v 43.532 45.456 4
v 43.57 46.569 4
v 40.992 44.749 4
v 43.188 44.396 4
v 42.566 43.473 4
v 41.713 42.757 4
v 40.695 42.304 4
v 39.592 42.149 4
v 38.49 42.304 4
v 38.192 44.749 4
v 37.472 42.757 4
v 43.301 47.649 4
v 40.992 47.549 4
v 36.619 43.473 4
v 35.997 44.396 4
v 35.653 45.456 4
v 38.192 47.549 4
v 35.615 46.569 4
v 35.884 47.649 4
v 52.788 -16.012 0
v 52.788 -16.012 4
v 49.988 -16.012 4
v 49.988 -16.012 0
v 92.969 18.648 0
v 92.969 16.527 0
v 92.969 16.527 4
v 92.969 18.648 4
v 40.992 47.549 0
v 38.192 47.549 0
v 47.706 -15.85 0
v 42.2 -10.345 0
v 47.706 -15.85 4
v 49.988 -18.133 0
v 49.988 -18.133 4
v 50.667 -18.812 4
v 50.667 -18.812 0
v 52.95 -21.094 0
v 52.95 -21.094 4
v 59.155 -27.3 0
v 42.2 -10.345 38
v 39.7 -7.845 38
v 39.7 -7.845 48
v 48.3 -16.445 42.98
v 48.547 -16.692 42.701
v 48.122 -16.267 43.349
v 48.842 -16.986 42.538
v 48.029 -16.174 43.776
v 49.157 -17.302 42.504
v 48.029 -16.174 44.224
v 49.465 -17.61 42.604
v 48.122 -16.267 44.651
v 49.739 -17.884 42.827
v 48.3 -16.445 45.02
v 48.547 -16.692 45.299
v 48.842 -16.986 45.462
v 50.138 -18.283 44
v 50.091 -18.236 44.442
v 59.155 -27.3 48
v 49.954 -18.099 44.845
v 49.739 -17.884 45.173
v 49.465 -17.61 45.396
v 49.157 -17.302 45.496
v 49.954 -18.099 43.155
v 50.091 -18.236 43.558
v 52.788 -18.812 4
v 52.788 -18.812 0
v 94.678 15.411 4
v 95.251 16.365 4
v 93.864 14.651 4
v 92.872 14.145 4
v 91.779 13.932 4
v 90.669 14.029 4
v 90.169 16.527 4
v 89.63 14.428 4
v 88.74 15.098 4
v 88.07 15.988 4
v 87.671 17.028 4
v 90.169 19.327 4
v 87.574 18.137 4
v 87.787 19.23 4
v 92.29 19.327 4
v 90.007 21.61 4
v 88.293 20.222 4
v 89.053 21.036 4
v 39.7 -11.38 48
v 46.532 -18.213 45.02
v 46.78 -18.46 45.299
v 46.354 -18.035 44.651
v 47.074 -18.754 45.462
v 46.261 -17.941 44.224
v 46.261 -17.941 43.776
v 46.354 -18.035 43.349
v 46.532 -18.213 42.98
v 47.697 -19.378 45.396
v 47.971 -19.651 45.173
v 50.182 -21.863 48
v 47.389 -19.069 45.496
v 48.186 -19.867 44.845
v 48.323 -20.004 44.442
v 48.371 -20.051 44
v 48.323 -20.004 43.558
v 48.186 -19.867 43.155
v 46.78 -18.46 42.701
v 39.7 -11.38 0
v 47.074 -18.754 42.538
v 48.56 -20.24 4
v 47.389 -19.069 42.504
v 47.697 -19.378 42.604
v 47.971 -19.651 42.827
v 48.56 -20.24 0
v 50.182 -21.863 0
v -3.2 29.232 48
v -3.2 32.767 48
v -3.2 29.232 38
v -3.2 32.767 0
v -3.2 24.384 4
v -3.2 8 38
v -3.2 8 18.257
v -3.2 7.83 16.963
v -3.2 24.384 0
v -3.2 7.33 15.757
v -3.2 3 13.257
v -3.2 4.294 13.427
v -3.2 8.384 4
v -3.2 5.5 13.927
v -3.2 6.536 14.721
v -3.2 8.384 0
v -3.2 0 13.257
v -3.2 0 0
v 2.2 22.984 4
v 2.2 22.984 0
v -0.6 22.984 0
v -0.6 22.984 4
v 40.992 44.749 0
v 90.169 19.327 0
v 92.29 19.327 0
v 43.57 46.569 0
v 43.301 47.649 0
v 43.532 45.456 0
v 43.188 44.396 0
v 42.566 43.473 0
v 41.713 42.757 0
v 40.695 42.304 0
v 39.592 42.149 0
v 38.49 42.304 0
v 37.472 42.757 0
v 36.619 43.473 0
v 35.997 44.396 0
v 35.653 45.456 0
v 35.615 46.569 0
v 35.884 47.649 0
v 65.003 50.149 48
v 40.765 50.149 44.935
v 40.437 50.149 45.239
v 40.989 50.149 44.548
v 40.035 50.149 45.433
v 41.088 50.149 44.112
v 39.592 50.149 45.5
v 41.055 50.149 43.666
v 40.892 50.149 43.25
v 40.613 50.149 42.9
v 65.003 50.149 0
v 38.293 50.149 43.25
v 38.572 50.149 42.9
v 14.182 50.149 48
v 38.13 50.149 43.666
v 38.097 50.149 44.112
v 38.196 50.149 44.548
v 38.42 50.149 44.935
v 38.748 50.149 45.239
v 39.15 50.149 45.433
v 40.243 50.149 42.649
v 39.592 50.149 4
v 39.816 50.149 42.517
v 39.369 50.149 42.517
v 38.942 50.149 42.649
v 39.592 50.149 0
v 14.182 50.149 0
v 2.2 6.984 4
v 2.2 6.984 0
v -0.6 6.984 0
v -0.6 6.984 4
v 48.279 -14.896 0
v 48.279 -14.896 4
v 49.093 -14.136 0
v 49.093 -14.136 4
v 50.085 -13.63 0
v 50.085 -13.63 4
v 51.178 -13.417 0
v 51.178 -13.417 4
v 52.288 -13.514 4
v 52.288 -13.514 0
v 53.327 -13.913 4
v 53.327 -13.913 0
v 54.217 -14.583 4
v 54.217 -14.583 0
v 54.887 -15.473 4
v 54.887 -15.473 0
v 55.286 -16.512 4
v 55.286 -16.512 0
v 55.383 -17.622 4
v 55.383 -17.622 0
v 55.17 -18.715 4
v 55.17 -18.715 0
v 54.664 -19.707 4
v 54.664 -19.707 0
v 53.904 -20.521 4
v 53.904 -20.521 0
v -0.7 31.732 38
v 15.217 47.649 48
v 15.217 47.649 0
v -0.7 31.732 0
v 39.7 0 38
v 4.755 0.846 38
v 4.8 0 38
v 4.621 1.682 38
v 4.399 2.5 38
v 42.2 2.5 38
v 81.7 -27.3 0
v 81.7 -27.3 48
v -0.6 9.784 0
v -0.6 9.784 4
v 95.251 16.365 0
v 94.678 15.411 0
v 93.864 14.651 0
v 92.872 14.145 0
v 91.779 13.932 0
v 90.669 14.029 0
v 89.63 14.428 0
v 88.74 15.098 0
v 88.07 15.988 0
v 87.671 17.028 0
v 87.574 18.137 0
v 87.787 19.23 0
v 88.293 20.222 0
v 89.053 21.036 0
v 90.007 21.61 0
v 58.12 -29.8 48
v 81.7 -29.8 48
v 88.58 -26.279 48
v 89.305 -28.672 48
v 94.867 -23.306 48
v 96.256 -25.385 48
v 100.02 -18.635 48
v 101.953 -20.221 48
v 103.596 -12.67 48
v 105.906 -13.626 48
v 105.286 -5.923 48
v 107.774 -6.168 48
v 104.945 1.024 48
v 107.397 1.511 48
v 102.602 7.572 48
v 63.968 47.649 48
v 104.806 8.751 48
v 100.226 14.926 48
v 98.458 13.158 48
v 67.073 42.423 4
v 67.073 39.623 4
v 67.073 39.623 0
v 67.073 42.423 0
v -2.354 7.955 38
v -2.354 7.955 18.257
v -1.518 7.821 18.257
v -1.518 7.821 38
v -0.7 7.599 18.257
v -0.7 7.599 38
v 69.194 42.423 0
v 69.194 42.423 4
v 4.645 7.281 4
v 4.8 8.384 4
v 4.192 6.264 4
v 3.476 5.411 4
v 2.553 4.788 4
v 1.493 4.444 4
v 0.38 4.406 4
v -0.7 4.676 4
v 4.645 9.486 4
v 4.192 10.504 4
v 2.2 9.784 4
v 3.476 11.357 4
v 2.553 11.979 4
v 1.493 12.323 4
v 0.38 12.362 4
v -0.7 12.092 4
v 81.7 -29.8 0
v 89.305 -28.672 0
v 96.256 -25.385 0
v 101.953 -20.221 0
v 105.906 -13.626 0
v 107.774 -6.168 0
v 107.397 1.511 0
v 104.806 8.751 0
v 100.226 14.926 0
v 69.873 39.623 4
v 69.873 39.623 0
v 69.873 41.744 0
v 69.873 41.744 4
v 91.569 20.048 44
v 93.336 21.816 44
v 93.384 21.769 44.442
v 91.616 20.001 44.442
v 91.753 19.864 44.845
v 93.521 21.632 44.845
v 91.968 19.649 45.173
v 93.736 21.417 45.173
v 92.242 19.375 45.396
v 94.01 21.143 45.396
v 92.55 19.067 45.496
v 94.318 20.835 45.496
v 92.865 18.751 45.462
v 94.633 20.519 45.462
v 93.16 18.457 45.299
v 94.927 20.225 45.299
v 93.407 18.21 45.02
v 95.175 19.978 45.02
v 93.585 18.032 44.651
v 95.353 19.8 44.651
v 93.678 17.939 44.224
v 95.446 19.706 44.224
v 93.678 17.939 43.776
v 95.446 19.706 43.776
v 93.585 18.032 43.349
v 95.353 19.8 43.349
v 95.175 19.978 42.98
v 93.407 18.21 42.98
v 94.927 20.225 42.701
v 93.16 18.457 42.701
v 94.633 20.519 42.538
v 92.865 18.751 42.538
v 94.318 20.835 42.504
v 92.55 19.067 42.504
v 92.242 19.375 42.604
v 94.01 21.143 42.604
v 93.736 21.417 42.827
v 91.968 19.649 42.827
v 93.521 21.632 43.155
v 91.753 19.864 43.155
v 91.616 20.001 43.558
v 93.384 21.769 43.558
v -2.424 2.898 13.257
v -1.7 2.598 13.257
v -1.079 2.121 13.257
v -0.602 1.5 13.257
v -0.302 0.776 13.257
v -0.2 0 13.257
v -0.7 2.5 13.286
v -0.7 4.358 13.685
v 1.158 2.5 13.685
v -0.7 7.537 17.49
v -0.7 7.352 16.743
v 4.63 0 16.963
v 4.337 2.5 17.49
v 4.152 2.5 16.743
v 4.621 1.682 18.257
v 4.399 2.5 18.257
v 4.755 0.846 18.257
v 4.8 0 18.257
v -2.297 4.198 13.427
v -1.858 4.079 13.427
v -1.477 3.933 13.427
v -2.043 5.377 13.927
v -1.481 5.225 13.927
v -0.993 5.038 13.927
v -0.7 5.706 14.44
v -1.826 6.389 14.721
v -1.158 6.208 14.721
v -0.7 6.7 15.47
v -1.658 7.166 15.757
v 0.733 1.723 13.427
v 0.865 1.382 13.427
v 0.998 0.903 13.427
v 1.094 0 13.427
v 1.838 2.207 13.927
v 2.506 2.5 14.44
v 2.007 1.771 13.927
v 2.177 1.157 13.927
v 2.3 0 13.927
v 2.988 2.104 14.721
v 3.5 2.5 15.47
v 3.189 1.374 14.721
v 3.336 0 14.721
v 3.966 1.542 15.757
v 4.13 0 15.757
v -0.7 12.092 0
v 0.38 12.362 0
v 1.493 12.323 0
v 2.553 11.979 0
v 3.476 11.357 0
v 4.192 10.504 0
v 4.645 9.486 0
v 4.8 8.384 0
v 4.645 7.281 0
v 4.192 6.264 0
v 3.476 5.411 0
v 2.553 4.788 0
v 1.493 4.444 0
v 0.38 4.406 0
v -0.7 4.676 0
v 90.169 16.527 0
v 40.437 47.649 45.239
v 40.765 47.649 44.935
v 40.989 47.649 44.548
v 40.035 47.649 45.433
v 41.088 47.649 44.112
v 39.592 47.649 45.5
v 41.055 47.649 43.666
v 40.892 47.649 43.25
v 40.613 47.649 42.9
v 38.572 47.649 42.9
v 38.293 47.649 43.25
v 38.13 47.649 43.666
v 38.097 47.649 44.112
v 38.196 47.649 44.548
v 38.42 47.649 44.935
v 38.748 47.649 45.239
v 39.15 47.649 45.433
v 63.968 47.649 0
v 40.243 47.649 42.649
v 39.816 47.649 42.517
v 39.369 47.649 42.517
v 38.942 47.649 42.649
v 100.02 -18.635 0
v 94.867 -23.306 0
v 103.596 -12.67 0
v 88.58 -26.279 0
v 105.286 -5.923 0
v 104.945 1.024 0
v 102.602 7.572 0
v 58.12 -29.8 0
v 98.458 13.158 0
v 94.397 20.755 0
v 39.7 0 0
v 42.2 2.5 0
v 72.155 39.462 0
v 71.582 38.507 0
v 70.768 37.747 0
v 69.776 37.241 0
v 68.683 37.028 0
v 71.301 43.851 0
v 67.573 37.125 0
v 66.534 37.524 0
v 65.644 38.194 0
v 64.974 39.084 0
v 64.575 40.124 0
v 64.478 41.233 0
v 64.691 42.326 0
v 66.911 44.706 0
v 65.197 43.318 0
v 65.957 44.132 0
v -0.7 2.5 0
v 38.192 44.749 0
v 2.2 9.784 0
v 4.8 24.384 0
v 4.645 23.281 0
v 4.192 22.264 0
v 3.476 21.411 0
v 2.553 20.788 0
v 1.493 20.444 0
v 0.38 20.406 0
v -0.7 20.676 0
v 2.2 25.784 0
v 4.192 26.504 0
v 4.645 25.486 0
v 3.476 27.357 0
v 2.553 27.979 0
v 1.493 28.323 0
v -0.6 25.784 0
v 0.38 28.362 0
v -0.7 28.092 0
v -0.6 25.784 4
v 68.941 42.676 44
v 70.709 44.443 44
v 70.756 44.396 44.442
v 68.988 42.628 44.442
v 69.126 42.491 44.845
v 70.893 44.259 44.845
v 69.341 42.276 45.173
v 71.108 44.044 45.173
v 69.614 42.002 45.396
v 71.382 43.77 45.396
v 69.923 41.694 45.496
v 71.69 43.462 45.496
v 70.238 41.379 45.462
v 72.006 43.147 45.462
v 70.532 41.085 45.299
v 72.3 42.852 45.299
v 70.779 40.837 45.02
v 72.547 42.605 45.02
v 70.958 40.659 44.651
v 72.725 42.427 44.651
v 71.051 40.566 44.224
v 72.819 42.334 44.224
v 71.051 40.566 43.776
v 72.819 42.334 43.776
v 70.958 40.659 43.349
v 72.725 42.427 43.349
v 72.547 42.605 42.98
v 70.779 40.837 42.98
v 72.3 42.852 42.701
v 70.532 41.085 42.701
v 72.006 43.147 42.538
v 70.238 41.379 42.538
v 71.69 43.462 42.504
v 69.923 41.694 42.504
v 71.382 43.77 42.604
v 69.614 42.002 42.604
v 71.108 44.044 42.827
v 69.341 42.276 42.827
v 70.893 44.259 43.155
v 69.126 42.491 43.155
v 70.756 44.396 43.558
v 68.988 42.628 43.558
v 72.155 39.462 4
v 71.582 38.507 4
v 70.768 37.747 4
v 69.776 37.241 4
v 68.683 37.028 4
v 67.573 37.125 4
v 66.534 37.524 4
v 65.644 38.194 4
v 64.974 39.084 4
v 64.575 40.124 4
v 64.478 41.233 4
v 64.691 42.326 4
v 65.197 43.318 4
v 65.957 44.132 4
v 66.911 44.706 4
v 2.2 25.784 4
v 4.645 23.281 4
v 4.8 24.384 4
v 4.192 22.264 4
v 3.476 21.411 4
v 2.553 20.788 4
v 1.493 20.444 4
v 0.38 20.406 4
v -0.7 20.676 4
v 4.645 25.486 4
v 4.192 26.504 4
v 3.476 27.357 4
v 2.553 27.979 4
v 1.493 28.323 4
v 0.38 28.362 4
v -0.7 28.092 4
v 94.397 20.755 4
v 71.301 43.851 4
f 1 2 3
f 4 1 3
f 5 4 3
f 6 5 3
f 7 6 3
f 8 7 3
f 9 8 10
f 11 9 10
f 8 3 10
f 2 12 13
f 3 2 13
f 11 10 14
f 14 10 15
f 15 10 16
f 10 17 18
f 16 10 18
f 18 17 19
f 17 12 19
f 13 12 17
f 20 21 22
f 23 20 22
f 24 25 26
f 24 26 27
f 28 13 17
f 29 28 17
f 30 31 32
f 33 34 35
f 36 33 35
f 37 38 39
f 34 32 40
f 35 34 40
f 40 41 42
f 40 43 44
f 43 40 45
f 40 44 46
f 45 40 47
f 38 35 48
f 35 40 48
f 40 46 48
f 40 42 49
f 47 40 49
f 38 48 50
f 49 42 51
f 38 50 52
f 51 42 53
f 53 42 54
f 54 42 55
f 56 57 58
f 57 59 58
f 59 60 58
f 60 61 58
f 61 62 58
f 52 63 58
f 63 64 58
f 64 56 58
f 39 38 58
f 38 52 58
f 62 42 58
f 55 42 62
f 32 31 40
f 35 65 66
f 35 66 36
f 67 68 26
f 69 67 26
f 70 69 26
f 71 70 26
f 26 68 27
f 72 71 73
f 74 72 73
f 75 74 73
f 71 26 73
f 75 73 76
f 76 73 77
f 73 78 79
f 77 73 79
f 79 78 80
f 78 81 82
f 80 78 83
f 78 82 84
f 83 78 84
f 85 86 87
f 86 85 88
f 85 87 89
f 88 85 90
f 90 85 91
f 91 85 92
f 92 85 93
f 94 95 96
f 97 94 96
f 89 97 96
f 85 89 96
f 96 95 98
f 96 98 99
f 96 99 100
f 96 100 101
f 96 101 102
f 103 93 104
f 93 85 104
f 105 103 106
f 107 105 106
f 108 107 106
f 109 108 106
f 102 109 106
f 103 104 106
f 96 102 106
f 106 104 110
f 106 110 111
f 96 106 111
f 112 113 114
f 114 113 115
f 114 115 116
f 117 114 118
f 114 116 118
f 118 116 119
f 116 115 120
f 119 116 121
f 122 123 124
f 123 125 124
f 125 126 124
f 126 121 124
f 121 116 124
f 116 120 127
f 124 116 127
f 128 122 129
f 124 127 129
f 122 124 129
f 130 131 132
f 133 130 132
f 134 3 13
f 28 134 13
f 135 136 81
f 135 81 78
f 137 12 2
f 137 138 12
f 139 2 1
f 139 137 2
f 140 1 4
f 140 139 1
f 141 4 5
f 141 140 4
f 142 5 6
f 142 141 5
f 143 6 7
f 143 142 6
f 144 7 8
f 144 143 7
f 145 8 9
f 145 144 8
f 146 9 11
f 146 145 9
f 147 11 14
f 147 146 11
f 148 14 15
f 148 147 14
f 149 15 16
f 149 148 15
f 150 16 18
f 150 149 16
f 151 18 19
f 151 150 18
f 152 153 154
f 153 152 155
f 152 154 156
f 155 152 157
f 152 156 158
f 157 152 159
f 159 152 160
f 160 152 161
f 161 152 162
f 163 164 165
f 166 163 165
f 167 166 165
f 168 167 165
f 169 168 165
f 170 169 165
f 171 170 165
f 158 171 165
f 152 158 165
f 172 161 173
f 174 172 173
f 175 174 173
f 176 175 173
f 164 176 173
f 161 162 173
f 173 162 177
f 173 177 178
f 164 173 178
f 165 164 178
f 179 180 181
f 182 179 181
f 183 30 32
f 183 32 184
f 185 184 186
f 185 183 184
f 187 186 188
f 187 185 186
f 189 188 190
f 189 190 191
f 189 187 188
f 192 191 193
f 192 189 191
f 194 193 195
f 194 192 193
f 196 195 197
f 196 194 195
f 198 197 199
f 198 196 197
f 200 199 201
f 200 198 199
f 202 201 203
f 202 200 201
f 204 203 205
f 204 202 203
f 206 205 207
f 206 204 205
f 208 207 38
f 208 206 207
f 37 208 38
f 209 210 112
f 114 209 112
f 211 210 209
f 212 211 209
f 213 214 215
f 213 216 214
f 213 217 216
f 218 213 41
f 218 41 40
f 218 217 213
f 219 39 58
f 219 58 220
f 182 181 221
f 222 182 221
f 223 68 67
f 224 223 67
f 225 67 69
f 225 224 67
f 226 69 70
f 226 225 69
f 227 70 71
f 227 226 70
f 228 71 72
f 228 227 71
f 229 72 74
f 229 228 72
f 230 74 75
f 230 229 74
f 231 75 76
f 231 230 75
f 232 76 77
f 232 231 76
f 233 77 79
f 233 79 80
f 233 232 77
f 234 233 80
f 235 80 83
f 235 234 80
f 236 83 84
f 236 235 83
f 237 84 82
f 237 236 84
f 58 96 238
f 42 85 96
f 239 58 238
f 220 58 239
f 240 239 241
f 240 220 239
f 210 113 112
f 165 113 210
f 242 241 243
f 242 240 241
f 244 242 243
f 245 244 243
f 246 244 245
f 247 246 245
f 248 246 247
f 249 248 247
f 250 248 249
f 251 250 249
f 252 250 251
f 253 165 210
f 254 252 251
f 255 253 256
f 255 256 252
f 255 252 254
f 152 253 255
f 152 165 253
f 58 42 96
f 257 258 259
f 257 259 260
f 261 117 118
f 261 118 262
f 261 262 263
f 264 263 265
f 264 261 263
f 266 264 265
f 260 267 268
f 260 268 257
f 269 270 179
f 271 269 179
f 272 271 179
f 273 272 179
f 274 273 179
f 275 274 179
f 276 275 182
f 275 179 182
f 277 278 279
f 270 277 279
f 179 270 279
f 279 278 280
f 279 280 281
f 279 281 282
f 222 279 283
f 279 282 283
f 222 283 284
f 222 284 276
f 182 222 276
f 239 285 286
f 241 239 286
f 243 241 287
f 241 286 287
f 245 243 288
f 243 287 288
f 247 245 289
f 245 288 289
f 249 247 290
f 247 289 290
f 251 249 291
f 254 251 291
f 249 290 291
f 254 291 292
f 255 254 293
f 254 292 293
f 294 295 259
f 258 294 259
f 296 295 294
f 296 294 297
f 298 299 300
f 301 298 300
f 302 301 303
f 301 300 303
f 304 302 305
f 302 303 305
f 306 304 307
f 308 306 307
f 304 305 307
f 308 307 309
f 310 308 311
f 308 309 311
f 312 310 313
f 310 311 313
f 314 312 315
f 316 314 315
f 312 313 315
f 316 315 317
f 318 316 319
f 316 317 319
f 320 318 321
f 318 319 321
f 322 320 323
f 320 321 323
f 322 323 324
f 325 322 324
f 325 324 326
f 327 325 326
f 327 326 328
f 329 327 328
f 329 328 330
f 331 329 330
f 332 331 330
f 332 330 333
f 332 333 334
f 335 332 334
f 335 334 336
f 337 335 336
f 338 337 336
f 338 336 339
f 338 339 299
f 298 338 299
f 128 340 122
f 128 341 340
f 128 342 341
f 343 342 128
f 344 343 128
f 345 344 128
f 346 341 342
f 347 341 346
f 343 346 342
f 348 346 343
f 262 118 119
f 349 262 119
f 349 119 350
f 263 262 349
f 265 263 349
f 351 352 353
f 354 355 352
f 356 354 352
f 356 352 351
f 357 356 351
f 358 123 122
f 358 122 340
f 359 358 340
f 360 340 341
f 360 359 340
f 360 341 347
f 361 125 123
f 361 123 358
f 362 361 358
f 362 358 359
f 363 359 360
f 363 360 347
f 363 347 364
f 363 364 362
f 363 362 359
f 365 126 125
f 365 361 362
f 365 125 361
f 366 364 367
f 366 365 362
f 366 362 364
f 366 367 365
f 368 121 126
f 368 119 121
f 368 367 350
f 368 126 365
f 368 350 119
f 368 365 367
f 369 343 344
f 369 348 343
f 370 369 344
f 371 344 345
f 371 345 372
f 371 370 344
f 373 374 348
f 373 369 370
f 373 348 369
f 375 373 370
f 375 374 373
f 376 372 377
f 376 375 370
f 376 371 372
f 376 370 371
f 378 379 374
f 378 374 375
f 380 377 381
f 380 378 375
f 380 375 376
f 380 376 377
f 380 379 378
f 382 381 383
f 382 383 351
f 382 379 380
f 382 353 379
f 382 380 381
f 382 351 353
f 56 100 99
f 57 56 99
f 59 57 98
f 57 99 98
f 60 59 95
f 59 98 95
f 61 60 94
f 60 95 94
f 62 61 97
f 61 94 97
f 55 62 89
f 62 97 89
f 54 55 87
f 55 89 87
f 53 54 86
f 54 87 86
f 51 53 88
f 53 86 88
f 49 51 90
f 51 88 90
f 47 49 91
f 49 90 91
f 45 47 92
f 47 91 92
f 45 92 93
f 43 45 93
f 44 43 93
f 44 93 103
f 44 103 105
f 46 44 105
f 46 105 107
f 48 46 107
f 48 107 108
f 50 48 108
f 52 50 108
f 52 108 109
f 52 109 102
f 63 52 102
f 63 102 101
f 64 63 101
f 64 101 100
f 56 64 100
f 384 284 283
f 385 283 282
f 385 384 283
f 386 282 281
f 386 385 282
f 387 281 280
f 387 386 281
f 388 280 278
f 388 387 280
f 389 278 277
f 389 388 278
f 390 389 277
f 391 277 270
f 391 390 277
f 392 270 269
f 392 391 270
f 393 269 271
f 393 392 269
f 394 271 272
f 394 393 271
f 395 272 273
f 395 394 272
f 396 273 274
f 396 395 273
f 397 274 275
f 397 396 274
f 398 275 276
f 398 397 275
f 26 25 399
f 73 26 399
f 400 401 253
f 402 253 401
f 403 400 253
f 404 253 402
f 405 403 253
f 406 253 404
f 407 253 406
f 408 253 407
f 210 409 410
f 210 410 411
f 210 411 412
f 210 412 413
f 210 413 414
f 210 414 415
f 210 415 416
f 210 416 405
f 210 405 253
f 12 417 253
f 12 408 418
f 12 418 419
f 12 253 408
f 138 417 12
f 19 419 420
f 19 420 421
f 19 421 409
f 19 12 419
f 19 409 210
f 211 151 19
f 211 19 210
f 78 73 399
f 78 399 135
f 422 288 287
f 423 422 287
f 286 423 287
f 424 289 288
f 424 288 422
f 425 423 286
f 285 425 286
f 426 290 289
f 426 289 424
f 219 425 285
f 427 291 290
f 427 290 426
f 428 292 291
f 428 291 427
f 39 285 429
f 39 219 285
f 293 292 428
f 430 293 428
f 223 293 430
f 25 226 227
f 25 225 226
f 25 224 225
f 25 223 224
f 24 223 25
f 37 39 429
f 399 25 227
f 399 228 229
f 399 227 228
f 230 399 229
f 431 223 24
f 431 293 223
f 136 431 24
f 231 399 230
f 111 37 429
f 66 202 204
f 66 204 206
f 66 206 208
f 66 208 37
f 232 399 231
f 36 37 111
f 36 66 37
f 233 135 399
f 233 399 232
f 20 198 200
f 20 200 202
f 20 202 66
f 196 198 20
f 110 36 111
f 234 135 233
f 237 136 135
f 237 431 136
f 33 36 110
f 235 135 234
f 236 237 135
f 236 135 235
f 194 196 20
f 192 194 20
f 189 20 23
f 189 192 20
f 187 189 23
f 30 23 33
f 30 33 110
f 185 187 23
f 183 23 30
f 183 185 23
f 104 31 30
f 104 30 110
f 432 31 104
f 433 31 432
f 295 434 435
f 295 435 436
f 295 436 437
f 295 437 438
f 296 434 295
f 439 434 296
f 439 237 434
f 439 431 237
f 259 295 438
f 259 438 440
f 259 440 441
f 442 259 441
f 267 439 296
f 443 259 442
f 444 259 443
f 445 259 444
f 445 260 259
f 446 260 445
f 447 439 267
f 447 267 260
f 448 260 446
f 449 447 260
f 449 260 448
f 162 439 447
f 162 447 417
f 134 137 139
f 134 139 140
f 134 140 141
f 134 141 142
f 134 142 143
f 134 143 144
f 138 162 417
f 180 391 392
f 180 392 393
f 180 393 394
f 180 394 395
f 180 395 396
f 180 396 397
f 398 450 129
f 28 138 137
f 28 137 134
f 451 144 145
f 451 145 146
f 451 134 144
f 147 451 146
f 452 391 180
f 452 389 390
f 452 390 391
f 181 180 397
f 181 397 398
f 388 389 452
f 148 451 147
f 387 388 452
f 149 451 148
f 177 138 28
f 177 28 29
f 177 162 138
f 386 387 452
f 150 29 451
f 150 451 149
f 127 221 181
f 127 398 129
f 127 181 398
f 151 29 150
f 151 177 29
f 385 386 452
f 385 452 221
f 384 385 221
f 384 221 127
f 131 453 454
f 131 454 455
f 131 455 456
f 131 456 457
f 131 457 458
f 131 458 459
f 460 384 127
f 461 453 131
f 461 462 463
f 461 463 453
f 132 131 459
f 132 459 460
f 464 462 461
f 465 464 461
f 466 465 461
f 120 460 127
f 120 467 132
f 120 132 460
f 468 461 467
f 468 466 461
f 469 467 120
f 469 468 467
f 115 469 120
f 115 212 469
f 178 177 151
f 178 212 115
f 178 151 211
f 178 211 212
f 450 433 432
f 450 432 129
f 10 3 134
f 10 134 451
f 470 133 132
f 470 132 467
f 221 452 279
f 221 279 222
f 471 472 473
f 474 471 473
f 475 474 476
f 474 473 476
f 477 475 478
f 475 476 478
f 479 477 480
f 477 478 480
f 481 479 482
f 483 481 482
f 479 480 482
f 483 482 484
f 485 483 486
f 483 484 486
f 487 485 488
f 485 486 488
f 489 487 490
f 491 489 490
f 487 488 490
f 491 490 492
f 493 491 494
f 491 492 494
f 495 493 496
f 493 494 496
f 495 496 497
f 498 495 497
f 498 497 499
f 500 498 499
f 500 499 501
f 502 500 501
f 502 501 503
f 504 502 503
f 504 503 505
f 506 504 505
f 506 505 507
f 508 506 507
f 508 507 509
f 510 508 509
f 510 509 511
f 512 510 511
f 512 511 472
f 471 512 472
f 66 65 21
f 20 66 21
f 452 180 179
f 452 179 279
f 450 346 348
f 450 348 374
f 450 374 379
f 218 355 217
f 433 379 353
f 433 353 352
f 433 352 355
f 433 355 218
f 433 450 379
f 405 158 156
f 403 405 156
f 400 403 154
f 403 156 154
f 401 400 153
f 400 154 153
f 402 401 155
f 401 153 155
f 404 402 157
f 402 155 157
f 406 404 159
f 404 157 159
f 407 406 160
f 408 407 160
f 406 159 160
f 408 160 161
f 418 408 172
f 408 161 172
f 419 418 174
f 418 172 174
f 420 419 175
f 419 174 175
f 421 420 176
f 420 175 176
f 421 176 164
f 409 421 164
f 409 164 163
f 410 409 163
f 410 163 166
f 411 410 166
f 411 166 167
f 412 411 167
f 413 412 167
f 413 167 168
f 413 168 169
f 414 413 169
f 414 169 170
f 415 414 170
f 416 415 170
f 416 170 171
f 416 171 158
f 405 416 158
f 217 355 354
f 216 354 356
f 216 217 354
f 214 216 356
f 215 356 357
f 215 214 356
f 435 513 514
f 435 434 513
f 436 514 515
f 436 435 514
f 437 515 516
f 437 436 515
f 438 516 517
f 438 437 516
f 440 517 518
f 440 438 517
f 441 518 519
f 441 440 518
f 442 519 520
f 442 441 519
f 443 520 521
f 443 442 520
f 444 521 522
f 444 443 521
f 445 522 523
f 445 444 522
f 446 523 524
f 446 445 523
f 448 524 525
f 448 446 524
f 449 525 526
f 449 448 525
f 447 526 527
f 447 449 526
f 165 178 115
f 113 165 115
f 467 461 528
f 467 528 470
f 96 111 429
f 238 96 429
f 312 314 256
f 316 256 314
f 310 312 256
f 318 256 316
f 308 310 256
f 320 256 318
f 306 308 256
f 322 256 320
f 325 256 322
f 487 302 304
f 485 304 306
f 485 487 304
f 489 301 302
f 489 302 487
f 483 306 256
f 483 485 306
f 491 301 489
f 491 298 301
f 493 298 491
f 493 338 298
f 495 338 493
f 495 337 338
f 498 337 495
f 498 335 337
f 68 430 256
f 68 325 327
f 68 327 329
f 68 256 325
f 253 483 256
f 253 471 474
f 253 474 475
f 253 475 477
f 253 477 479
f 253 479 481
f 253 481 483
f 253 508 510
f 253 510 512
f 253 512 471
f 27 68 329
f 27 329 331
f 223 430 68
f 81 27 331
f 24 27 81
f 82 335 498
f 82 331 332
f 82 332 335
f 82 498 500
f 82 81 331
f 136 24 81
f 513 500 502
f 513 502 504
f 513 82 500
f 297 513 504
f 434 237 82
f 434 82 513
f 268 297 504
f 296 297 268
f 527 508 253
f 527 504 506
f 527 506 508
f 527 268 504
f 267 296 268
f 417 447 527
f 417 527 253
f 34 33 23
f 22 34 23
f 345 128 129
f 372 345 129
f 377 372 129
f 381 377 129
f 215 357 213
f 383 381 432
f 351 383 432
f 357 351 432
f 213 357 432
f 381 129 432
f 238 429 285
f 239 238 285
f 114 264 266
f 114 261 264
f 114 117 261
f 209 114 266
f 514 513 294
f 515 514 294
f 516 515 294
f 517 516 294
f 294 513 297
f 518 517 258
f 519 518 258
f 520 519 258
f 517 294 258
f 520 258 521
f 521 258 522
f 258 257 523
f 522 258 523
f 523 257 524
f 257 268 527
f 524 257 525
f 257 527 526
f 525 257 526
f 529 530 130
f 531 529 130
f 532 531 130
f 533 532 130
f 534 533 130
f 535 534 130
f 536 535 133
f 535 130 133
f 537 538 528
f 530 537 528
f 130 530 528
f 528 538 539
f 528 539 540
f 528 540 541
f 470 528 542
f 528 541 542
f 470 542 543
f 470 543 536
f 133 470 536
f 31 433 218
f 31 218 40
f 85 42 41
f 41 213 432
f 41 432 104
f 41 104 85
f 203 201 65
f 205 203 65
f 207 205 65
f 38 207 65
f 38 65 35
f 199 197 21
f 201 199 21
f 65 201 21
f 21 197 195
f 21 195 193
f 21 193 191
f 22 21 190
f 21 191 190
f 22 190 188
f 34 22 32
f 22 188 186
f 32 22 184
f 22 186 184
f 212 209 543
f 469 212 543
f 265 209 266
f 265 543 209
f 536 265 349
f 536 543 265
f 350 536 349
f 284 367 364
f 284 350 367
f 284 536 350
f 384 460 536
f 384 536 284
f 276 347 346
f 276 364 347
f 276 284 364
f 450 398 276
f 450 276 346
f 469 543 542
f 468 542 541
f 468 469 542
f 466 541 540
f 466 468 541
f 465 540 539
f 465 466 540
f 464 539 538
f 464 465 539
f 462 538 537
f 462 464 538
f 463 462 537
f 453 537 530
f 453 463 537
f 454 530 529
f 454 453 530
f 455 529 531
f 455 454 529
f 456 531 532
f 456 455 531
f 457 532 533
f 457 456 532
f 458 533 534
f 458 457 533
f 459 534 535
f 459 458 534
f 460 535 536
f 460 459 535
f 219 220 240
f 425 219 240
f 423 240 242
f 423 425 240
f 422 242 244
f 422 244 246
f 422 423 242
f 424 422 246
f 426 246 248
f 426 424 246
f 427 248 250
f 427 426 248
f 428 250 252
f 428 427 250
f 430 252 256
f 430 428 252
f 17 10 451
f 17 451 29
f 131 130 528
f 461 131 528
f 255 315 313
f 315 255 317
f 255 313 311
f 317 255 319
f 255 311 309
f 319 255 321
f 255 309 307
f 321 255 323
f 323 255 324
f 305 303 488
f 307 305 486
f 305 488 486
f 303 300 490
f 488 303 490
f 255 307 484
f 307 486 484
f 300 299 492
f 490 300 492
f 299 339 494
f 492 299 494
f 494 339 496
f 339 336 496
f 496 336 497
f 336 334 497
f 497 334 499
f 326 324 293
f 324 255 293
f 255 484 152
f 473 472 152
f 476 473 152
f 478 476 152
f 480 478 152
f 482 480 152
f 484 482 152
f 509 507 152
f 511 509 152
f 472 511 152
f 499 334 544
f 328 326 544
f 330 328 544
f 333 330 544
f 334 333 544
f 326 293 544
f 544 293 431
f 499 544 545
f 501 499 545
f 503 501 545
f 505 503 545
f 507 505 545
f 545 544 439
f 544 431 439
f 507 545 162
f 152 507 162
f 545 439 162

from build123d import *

# Parameters (mm, degrees)
RESSALTO_EXTRUS_O1_DEPTH = 48
ESBO_O12_R               = 1.5
CORTE_EXTRUS_O10_DEPTH   = 10
ESBO_O13_R               = 1.5
CORTE_EXTRUS_O11_DEPTH   = 10
ESBO_O14_R               = 1.5
CORTE_EXTRUS_O12_DEPTH   = 10
ESBO_O15_R               = 1.5
CORTE_EXTRUS_O13_DEPTH   = 10
CORTE_EXTRUS_O14_DEPTH   = 10
ESBO_O17_R               = 4
ESBO_O17_W               = 2.8
ESBO_O17_H               = 2.8
RESSALTO_EXTRUS_O2_DEPTH = 4
CORTE_EXTRUS_O15_DEPTH   = 10


with BuildPart() as part:
    # Model → Ressalto-extrusão1 (new body)
    with BuildSketch(Plane.XY):
        with BuildLine():
            Line((-0.7, 0), (39, 0))
            Line((39, 0), (39.7, 0))
            Line((39.7, 0), (39.7, -11.380317396))
            Line((39.7, -11.380317396), (50.182424304, -21.8627417))
            Line((50.182424304, -21.8627417), (58.119682605, -29.8))
            Line((58.119682605, -29.8), (81.7, -29.8))
            ThreePointArc((81.7, -29.8), (105.905643752, -13.626305928), (100.226197667, 14.926197667))
            Line((100.226197667, 14.926197667), (65.00338056, 50.149014774))
            Line((65.00338056, 50.149014774), (50.111140335, 50.149014774))
            Line((50.111140335, 50.149014774), (14.181595121, 50.149014774))
            Line((14.181595121, 50.149014774), (-3.2, 32.767419653))
            Line((-3.2, 32.767419653), (-3.2, 5))
            Line((-3.2, 5), (-3.2, 0))
            Line((-3.2, 0), (-0.7, 0))
        make_face()
        with BuildLine():
            Line((-0.7, 2.5), (39, 2.5))
            Line((39, 2.5), (39.7, 2.5))
            Line((39.7, 2.5), (42.2, 2.5))
            Line((42.2, 2.5), (42.2, -10.34478349))
            Line((42.2, -10.34478349), (51.950191257, -20.094974747))
            Line((51.950191257, -20.094974747), (59.15521651, -27.3))
            Line((59.15521651, -27.3), (81.7, -27.3))
            ThreePointArc((81.7, -27.3), (103.595944921, -12.669597347), (98.458430714, 13.158430714))
            Line((98.458430714, 13.158430714), (63.967846654, 47.649014774))
            Line((63.967846654, 47.649014774), (50.111140335, 47.649014774))
            Line((50.111140335, 47.649014774), (15.217129027, 47.649014774))
            Line((15.217129027, 47.649014774), (-0.7, 31.731885747))
            Line((-0.7, 31.731885747), (-0.7, 2.5))
        make_face(mode=Mode.SUBTRACT)
    extrude(amount=RESSALTO_EXTRUS_O1_DEPTH)

    # Esboço12 → Corte-extrusão10 (cut)
    with BuildSketch(Plane(origin=(57.576197667, 57.576197667, 0), x_dir=(0, 0, -1), z_dir=(0.7071067811865476, 0.7071067811865475, 0))):
        with Locations(Location((-44, -20.072657306, 0), (0, 0, 90))):
            Circle(ESBO_O12_R)
        with Locations(Location((-44, -52.072657306, 0), (0, 0, 90))):
            Circle(ESBO_O12_R)
    extrude(amount=-CORTE_EXTRUS_O10_DEPTH, mode=Mode.SUBTRACT)

    # Esboço13 → Corte-extrusão11 (cut)
    with BuildSketch(Plane(origin=(0, 50.149014774, 0), x_dir=(1, 0, 0), z_dir=(0, 1, 0))):
        with Locations(Location((39.59248784, -44, 0), (0, 0, 270))):
            Circle(ESBO_O13_R)
    extrude(amount=-CORTE_EXTRUS_O11_DEPTH, mode=Mode.SUBTRACT)

    # Esboço14 → Corte-extrusão12 (cut)
    with BuildSketch(Plane.ZY.offset(3.2)):
        with Locations((44, 23.701037279)):
            Circle(ESBO_O14_R)
        with Locations((44, 7.740898975)):
            Circle(ESBO_O14_R)
    extrude(amount=-CORTE_EXTRUS_O12_DEPTH, mode=Mode.SUBTRACT)

    # Esboço15 → Corte-extrusão13 (cut)
    with BuildSketch(Plane(origin=(14.159841302, 14.159841302, 0), x_dir=(0, 0, 1), z_dir=(-0.7071067811865477, -0.7071067811865475, 0))):
        with Locations(Location((44, -46.881179593, 0), (0, 0, 270))):
            Circle(ESBO_O15_R)
    extrude(amount=-CORTE_EXTRUS_O13_DEPTH, mode=Mode.SUBTRACT)

    # Esboço16 → Corte-extrusão14 (cut)
    with BuildSketch(Plane.XY.offset(48)):
        Polygon((39.7, 0), (39.7, -7.84478349), (42.2, -10.34478349), (42.2, 2.5), (-0.7, 2.5), (-0.7, 0), align=None)
    extrude(amount=-CORTE_EXTRUS_O14_DEPTH, mode=Mode.SUBTRACT)

    # Esboço17 → Ressalto-extrusão2 (add)
    # profile 1 of 6: a face of its own
    with BuildSketch(Plane(origin=(0, 0, 0), x_dir=(-1, 0, 0), z_dir=(0, 0, -1))):
        with Locations((-91.568699638, 17.926841447)):
            Circle(ESBO_O17_R)
        with Locations((-91.568699638, 17.926841447)):
            Rectangle(ESBO_O17_W, ESBO_O17_H, mode=Mode.SUBTRACT)
    # profile 2 of 6: a face of its own
    with BuildSketch(Plane(origin=(0, 0, 0), x_dir=(-1, 0, 0), z_dir=(0, 0, -1))):
        with Locations((-68.47265349, 41.022887595)):
            Circle(ESBO_O17_R)
        with Locations((-68.47265349, 41.022887595)):
            Rectangle(ESBO_O17_W, ESBO_O17_H, mode=Mode.SUBTRACT)
    # profile 3 of 6: a face of its own
    with BuildSketch(Plane(origin=(0, 0, 0), x_dir=(-1, 0, 0), z_dir=(0, 0, -1))):
        with Locations((-39.59248784, 46.149014774)):
            Circle(ESBO_O17_R)
        with Locations((-39.59248784, 46.149014774)):
            Rectangle(ESBO_O17_W, ESBO_O17_H, mode=Mode.SUBTRACT)
    # profile 4 of 6: a face of its own
    with BuildSketch(Plane(origin=(0, 0, 0), x_dir=(-1, 0, 0), z_dir=(0, 0, -1))):
        with Locations((-0.8, 24.383709827)):
            Circle(ESBO_O17_R)
        with Locations((-0.8, 24.383709827)):
            Rectangle(ESBO_O17_W, ESBO_O17_H, mode=Mode.SUBTRACT)
    # profile 5 of 6: a face of its own
    with BuildSketch(Plane(origin=(0, 0, 0), x_dir=(-1, 0, 0), z_dir=(0, 0, -1))):
        with Locations((-0.8, 8.383709827)):
            Circle(ESBO_O17_R)
        with Locations((-0.8, 8.383709827)):
            Rectangle(ESBO_O17_W, ESBO_O17_H, mode=Mode.SUBTRACT)
    # profile 6 of 6: a face of its own
    with BuildSketch(Plane(origin=(0, 0, 0), x_dir=(-1, 0, 0), z_dir=(0, 0, -1))):
        with Locations((-51.388268427, -17.411731573)):
            Circle(ESBO_O17_R)
        with Locations((-51.388268427, -17.411731573)):
            Rectangle(ESBO_O17_W, ESBO_O17_H, mode=Mode.SUBTRACT)
    extrude(amount=-RESSALTO_EXTRUS_O2_DEPTH)

    # Esboço18 → Corte-extrusão15 (cut)
    with BuildSketch(Plane.XY.offset(48)):
        Polygon((-0.7, 31.731885747), (-32.431885747, 0), (-0.7, 0), align=None)
    extrude(amount=-CORTE_EXTRUS_O15_DEPTH, mode=Mode.SUBTRACT)

    # Esboço19 → Corte-Revolução1 (revolve, cut)
    with BuildSketch(Plane.ZY.offset(3.2)):
        with BuildLine():
            Line((38.25689259, 0), (13.25689259, 0))
            Line((13.25689259, 0), (13.25689259, 3))
            ThreePointArc((13.25689259, 3), (14.721358684, 6.535533906), (18.25689259, 8))
            Line((18.25689259, 8), (38.25689259, 8))
            Line((38.25689259, 8), (38.25689259, 0))
        make_face()
    revolve(axis=Axis((-3.2, 0, 38.25689259), (0, 0, -1)), mode=Mode.SUBTRACT)


solid = part.part
